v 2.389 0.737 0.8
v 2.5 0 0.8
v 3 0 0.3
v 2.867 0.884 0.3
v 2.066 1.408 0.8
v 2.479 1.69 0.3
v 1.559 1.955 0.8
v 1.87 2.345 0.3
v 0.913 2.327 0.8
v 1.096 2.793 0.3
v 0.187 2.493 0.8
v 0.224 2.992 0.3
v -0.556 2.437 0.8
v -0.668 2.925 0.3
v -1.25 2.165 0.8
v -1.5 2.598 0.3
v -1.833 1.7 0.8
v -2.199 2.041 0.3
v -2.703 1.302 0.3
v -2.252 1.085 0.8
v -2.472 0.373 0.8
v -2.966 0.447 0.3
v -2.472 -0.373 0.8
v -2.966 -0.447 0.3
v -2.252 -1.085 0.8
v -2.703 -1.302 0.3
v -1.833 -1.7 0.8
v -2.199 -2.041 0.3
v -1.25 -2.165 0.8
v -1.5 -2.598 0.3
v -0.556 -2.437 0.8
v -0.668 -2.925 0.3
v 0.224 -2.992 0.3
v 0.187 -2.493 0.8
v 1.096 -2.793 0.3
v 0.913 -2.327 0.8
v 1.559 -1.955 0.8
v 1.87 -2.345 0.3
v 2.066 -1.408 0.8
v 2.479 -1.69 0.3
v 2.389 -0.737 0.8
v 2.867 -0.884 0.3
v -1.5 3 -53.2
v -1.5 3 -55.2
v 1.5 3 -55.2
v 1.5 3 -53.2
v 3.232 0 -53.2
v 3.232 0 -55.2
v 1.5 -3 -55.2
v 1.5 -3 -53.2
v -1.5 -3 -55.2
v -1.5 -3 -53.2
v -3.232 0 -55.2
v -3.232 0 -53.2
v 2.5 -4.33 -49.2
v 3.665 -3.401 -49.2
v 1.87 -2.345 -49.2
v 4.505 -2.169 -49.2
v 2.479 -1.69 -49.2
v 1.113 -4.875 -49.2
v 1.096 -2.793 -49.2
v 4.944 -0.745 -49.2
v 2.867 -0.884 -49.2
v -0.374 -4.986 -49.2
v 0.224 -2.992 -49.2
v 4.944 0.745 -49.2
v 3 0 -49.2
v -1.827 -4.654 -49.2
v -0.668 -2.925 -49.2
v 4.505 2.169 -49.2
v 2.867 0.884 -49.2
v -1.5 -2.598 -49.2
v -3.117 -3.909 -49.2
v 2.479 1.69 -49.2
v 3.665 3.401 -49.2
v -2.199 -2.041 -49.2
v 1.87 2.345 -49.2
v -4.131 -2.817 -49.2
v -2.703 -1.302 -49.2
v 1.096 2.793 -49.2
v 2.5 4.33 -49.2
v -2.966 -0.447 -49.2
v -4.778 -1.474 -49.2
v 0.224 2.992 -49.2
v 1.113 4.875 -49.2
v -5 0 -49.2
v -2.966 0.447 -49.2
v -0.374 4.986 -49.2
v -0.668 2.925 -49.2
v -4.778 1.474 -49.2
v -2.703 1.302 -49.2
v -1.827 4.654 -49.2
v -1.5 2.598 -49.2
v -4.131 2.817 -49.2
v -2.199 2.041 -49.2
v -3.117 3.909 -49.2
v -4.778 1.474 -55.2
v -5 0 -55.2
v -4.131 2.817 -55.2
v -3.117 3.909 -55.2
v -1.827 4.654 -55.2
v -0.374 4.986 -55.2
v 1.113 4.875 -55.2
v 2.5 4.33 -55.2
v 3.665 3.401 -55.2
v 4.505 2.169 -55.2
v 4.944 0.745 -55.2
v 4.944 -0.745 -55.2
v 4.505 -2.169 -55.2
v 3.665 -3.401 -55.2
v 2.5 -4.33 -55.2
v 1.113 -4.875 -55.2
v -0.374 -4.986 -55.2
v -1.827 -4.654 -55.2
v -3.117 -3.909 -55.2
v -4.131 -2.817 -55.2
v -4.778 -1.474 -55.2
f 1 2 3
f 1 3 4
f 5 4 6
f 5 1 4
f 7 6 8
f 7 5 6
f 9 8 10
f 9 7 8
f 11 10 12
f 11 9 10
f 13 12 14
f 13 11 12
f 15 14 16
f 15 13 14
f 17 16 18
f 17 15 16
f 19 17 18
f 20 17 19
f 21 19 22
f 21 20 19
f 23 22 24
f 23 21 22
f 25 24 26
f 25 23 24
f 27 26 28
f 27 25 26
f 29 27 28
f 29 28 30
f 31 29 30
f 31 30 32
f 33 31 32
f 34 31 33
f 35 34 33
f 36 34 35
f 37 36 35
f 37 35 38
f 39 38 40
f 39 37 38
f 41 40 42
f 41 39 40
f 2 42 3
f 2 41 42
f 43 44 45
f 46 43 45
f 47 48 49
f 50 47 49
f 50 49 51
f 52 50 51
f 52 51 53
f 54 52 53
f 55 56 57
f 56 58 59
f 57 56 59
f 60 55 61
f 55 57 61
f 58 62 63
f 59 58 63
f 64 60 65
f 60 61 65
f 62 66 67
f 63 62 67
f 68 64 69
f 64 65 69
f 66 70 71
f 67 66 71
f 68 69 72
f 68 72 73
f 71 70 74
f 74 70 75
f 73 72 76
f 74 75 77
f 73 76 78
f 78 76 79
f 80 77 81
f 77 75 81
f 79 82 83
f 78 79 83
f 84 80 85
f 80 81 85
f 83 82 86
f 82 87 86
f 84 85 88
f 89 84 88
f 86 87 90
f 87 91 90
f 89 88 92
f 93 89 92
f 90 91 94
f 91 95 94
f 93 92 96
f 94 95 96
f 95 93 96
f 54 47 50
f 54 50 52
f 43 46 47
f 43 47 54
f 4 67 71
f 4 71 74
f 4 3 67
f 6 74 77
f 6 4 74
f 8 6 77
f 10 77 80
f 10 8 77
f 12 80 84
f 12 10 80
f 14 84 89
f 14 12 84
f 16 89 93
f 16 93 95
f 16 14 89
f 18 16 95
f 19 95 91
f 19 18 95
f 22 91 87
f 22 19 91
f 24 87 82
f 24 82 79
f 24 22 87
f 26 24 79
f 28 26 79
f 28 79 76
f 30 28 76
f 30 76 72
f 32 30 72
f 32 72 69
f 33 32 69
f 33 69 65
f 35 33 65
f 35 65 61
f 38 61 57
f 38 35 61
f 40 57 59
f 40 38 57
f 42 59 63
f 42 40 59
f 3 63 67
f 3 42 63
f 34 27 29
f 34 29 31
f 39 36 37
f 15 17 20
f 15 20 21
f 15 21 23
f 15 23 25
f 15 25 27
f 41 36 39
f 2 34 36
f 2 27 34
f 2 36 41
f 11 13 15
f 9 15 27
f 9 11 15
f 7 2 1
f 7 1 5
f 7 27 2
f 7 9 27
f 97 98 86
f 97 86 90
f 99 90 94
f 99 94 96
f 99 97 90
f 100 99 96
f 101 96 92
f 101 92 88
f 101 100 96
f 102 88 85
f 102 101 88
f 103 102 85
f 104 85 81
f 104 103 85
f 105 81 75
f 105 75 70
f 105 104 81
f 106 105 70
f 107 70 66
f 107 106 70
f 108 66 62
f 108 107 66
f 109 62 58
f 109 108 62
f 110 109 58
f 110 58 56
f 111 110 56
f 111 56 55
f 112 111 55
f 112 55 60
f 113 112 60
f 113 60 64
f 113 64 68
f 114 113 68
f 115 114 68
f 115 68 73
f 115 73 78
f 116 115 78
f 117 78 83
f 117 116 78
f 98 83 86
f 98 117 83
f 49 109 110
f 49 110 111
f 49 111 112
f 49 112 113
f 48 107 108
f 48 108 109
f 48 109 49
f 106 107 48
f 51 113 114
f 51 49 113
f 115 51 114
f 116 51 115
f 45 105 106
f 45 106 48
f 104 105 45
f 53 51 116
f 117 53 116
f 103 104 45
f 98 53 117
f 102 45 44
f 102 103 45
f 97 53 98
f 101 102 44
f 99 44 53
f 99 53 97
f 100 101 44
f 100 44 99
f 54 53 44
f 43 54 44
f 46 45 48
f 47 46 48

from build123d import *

# Parameters (mm, degrees)
ESTRUSIONE_ESTRUSIONE1_START      = -11.2
SCHIZZO1_R                        = 3
ESTRUSIONE_ESTRUSIONE1_DEPTH      = 12
ESTRUSIONE_ESTRUSIONE1_DEPTH_BACK = 44
SMUSSO1_SIZE                      = 0.5
SCHIZZO4_R                        = 5
ESTRUSIONE_ESTRUSIONE2_DEPTH      = 6
TAGLIO_ESTRUSIONE1_DEPTH          = 2


with BuildPart() as part:
    # Schizzo1 → Estrusione-Estrusione1 (new body, two sides)
    with BuildSketch(Plane.XY.offset(ESTRUSIONE_ESTRUSIONE1_START)) as estrusione_estrusione1_sk:
        Circle(SCHIZZO1_R)
    extrude(amount=ESTRUSIONE_ESTRUSIONE1_DEPTH)
    extrude(estrusione_estrusione1_sk.sketch, amount=-ESTRUSIONE_ESTRUSIONE1_DEPTH_BACK)

    # Smusso1
    smusso1_edges = [part.edges().sort_by_distance(p)[0] for p in [
        (-3, 0, 0.8),
        (-3, 0, -55.2),
    ]]
    chamfer(smusso1_edges, length=SMUSSO1_SIZE)

    # Schizzo4 → Estrusione-Estrusione2 (add)
    with BuildSketch(Plane(origin=(0, 0, -55.2), x_dir=(-1, 0, 0), z_dir=(0, 0, -1))):
        Circle(SCHIZZO4_R)
    extrude(amount=-ESTRUSIONE_ESTRUSIONE2_DEPTH)

    # Schizzo6 → Taglio-Estrusione1 (cut)
    with BuildSketch(Plane(origin=(0, 0, -55.2), x_dir=(-1, 0, 0), z_dir=(0, 0, -1))):
        Polygon((1.5, 3), (-1.5, 3), (-3.232050808, 0), (-1.5, -3), (1.5, -3), (3.232050808, 0), align=None)
    extrude(amount=-TAGLIO_ESTRUSIONE1_DEPTH, mode=Mode.SUBTRACT)


solid = part.part
